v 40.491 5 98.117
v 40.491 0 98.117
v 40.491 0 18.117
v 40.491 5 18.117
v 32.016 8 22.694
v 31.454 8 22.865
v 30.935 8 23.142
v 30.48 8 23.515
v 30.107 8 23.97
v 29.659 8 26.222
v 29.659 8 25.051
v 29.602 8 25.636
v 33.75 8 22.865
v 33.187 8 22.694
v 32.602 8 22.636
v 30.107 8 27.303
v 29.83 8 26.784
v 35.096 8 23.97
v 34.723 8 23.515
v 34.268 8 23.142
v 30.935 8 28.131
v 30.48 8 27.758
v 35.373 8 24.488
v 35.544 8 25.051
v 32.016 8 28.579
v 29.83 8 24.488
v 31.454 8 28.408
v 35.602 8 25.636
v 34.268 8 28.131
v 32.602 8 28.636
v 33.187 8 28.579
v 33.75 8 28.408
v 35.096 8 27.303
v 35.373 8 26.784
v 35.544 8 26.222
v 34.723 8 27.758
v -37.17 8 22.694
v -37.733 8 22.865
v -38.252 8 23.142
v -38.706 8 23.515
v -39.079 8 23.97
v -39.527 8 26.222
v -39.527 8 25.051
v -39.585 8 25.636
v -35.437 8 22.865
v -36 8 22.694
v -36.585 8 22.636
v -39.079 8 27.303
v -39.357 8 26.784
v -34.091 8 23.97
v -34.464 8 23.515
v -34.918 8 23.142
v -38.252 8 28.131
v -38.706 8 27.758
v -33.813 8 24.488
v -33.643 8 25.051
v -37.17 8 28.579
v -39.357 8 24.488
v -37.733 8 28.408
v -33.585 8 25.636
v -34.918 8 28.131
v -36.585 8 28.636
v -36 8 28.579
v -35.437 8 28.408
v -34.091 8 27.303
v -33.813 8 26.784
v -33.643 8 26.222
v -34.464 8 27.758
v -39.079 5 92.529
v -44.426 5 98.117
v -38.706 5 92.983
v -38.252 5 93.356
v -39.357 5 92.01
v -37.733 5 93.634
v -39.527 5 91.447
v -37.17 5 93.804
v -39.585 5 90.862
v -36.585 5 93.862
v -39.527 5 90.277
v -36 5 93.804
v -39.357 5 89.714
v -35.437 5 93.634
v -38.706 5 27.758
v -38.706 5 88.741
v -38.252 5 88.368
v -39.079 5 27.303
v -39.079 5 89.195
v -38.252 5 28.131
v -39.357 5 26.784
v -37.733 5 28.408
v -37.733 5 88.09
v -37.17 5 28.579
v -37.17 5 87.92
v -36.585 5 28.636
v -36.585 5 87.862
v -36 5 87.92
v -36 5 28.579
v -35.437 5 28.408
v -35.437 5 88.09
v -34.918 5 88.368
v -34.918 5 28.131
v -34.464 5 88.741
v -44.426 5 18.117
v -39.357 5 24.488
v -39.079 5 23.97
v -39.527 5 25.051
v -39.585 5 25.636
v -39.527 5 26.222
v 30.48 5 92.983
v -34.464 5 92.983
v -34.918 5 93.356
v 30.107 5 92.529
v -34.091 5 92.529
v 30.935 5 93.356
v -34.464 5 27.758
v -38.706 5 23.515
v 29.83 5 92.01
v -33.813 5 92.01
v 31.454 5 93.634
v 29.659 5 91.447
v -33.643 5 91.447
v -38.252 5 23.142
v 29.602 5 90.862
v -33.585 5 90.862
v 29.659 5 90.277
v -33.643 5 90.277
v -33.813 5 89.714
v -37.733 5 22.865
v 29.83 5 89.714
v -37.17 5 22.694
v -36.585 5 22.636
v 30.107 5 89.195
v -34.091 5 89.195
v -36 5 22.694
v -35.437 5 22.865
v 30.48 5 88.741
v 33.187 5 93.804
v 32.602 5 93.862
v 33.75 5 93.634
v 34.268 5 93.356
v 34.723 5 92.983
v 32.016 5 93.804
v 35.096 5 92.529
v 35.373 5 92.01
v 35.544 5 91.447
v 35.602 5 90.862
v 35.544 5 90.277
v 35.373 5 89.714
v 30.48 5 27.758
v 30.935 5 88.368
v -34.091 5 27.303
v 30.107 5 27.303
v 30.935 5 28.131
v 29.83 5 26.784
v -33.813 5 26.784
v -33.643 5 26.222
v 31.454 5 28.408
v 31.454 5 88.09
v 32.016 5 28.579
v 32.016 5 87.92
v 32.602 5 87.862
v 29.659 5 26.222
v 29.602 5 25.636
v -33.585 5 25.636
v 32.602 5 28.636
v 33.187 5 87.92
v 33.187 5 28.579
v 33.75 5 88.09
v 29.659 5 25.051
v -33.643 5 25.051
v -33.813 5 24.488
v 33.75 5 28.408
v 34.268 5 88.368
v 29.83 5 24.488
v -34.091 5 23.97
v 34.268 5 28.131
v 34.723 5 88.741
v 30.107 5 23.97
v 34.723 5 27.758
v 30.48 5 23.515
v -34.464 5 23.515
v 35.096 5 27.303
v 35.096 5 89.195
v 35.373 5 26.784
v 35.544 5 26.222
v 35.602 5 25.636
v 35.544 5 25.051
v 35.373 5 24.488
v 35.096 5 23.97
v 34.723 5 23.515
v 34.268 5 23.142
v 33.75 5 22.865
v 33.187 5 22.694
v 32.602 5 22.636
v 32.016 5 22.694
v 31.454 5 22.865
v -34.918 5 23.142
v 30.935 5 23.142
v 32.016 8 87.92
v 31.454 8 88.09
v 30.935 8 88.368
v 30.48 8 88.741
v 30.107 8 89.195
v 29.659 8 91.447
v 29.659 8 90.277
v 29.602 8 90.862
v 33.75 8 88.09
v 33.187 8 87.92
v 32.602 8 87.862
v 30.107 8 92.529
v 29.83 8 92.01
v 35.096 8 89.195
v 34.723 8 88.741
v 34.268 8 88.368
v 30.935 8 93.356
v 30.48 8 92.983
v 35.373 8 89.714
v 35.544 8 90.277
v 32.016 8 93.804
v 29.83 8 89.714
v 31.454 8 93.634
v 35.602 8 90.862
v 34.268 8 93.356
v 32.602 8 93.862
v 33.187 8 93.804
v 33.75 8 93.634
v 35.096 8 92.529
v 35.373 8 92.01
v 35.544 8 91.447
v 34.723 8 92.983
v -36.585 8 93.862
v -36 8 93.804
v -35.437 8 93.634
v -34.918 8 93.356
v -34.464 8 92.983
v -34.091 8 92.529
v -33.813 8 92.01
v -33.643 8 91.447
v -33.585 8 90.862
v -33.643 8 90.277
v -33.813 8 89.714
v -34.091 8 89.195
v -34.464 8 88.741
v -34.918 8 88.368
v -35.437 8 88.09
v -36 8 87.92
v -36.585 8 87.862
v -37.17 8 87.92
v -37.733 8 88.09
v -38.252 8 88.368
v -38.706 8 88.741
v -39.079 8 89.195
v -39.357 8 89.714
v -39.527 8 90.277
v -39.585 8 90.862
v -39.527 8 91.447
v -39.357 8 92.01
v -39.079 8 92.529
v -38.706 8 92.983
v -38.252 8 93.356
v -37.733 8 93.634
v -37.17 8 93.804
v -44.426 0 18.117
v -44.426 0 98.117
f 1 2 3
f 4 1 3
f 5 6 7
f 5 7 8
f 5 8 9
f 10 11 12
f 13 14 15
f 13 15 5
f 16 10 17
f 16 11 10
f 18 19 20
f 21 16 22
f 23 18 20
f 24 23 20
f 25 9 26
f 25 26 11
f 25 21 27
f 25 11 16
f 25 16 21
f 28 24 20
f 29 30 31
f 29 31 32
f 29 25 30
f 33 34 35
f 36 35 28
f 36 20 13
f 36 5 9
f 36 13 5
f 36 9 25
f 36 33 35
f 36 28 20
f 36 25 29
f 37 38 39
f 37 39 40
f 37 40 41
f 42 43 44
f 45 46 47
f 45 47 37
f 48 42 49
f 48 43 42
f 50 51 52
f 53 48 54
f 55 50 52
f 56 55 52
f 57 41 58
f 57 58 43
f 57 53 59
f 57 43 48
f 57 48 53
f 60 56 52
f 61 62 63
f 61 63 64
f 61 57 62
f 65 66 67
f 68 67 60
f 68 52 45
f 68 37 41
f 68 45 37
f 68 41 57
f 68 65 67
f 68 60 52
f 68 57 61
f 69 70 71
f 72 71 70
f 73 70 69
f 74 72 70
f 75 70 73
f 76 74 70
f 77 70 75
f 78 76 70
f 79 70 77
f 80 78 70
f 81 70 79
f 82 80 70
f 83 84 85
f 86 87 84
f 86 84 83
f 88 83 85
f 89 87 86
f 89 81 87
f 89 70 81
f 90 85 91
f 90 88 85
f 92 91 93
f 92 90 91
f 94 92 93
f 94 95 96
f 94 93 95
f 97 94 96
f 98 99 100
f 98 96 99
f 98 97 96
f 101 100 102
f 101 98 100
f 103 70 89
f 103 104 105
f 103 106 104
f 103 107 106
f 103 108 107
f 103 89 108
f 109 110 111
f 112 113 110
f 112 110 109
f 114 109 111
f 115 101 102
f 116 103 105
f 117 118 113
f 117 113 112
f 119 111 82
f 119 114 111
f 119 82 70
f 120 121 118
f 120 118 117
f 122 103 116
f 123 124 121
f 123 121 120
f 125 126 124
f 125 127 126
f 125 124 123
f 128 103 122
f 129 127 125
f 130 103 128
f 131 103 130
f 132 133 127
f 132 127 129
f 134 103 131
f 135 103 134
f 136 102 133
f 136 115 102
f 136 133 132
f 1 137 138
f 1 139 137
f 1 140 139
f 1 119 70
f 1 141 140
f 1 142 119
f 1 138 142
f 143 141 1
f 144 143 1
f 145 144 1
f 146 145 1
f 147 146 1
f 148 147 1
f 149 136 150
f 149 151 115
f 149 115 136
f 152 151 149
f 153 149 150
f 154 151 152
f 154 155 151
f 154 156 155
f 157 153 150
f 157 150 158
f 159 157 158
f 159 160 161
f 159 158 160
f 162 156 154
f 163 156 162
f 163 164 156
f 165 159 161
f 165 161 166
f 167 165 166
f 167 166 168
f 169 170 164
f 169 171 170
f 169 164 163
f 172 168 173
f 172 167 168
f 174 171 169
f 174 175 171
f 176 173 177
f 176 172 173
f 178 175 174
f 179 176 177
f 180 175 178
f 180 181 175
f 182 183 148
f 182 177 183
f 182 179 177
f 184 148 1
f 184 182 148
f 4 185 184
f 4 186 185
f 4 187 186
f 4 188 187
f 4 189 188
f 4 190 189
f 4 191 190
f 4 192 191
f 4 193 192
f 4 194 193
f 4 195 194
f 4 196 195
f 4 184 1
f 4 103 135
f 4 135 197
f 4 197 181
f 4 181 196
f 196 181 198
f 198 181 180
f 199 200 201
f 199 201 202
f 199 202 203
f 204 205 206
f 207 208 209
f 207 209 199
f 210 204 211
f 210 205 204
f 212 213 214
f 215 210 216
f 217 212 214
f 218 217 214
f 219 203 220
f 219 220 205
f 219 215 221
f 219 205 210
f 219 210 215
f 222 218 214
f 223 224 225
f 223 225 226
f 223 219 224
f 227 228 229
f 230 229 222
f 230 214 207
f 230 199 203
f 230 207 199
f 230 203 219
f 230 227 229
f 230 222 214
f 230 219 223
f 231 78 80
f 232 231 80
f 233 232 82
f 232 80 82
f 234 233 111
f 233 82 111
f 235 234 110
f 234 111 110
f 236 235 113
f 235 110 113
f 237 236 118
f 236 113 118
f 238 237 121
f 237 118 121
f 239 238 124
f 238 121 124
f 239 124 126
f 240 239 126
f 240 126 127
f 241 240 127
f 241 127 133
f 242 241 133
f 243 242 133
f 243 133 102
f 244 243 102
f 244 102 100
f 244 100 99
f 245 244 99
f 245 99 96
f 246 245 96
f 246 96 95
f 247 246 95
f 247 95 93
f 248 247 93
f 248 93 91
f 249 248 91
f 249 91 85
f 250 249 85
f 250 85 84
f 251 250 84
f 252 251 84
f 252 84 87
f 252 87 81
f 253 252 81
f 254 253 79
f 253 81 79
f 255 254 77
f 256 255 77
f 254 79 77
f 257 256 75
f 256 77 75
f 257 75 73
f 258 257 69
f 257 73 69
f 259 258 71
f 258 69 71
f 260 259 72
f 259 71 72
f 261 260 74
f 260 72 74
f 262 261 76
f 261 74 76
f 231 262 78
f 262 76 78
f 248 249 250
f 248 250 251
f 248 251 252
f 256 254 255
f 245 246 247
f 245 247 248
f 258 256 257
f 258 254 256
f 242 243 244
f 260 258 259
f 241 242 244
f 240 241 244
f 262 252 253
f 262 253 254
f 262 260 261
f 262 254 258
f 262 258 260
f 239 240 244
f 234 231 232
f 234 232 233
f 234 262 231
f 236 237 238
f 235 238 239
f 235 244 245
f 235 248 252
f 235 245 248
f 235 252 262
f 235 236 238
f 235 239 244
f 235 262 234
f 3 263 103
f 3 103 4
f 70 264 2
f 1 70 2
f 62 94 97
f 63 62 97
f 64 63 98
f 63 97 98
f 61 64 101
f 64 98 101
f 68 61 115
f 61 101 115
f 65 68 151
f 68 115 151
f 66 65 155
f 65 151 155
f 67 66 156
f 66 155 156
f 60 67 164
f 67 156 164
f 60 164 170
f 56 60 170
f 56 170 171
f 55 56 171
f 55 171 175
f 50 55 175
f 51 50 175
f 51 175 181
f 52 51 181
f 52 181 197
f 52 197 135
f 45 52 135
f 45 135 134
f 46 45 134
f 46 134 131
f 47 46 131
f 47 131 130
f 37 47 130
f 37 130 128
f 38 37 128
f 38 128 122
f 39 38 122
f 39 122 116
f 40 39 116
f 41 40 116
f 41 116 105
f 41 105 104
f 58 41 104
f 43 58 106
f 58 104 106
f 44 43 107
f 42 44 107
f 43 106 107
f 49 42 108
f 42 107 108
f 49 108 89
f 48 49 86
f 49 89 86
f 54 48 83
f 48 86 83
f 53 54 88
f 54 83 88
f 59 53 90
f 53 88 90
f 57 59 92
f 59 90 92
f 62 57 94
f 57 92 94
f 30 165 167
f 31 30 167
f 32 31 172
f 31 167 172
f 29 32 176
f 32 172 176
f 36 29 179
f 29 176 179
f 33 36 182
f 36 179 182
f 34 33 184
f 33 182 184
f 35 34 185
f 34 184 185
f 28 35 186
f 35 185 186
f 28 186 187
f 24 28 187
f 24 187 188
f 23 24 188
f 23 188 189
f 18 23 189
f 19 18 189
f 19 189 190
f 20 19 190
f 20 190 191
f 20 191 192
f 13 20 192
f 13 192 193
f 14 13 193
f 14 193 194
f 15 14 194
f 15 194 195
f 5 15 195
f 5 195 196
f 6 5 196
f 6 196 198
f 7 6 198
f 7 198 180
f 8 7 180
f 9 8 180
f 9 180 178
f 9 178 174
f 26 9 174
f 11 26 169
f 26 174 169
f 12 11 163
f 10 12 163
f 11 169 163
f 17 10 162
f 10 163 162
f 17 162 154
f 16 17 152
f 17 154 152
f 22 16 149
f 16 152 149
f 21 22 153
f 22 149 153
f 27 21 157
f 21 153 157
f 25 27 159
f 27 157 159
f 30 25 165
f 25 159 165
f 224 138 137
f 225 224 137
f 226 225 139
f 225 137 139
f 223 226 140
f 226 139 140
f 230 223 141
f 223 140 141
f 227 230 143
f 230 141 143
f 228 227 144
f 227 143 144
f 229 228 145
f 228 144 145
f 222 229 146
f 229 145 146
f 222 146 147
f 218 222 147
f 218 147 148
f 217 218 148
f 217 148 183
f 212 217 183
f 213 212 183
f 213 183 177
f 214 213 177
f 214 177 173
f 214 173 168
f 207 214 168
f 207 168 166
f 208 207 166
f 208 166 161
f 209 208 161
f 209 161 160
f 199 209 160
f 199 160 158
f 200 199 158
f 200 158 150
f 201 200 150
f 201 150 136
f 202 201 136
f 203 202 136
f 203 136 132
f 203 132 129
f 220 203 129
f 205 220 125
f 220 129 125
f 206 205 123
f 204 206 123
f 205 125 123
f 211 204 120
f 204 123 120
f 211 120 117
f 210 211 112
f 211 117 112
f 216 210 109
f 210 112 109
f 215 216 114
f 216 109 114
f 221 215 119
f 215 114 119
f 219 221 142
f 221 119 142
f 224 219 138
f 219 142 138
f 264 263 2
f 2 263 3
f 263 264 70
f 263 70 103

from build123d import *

# Parameters (mm, degrees)
SKETCH_4_W           = 84.916455131
SKETCH_4_H           = 80
SKETCH_4_R           = 3
EXTRUDE_1_DEPTH      = 5
EXTRUDE_2_DEPTH      = 3
EXTRUDE_2_DEPTH_BACK = 5
SKETCH_5_R           = 3


with BuildPart() as part:
    # 草图4 → 凸台-拉伸1 (new body)
    with BuildSketch(Plane(origin=(0, 0, 0), x_dir=(1, 0, 0), z_dir=(0, 1, 0))):
        with Locations((-1.967483917, -58.11712094)):
            Rectangle(SKETCH_4_W, SKETCH_4_H)
        with Locations(Location((-36.585071707, -25.636349073, 0), (0, 0, 270))):
            Circle(SKETCH_4_R, mode=Mode.SUBTRACT)
        with Locations(Location((32.601613083, -25.636349073, 0), (0, 0, 270))):
            Circle(SKETCH_4_R, mode=Mode.SUBTRACT)
        with Locations(Location((-36.585071707, -90.861964123, 0), (0, 0, 270))):
            Circle(SKETCH_4_R, mode=Mode.SUBTRACT)
        with Locations(Location((32.601613083, -90.861964123, 0), (0, 0, 270))):
            Circle(SKETCH_4_R, mode=Mode.SUBTRACT)
    extrude(amount=EXTRUDE_1_DEPTH)

    # 草图5 → 凸台-拉伸2 (add, two sides: drawn at the far end of the back side and taken through both)
    with BuildSketch(Plane(origin=(0, 5, 0), x_dir=(1, 0, 0), z_dir=(0, 1, 0)).offset(-EXTRUDE_2_DEPTH_BACK)):
        with Locations(Location((-36.585071707, -25.636349073, 0), (0, 0, 270))):
            Circle(SKETCH_5_R)
        with Locations(Location((32.601613083, -25.636349073, 0), (0, 0, 270))):
            Circle(SKETCH_5_R)
        with Locations(Location((-36.585071707, -90.861964123, 0), (0, 0, 270))):
            Circle(SKETCH_5_R)
        with Locations(Location((32.601613083, -90.861964123, 0), (0, 0, 270))):
            Circle(SKETCH_5_R)
    extrude(amount=EXTRUDE_2_DEPTH + EXTRUDE_2_DEPTH_BACK)


solid = part.part
